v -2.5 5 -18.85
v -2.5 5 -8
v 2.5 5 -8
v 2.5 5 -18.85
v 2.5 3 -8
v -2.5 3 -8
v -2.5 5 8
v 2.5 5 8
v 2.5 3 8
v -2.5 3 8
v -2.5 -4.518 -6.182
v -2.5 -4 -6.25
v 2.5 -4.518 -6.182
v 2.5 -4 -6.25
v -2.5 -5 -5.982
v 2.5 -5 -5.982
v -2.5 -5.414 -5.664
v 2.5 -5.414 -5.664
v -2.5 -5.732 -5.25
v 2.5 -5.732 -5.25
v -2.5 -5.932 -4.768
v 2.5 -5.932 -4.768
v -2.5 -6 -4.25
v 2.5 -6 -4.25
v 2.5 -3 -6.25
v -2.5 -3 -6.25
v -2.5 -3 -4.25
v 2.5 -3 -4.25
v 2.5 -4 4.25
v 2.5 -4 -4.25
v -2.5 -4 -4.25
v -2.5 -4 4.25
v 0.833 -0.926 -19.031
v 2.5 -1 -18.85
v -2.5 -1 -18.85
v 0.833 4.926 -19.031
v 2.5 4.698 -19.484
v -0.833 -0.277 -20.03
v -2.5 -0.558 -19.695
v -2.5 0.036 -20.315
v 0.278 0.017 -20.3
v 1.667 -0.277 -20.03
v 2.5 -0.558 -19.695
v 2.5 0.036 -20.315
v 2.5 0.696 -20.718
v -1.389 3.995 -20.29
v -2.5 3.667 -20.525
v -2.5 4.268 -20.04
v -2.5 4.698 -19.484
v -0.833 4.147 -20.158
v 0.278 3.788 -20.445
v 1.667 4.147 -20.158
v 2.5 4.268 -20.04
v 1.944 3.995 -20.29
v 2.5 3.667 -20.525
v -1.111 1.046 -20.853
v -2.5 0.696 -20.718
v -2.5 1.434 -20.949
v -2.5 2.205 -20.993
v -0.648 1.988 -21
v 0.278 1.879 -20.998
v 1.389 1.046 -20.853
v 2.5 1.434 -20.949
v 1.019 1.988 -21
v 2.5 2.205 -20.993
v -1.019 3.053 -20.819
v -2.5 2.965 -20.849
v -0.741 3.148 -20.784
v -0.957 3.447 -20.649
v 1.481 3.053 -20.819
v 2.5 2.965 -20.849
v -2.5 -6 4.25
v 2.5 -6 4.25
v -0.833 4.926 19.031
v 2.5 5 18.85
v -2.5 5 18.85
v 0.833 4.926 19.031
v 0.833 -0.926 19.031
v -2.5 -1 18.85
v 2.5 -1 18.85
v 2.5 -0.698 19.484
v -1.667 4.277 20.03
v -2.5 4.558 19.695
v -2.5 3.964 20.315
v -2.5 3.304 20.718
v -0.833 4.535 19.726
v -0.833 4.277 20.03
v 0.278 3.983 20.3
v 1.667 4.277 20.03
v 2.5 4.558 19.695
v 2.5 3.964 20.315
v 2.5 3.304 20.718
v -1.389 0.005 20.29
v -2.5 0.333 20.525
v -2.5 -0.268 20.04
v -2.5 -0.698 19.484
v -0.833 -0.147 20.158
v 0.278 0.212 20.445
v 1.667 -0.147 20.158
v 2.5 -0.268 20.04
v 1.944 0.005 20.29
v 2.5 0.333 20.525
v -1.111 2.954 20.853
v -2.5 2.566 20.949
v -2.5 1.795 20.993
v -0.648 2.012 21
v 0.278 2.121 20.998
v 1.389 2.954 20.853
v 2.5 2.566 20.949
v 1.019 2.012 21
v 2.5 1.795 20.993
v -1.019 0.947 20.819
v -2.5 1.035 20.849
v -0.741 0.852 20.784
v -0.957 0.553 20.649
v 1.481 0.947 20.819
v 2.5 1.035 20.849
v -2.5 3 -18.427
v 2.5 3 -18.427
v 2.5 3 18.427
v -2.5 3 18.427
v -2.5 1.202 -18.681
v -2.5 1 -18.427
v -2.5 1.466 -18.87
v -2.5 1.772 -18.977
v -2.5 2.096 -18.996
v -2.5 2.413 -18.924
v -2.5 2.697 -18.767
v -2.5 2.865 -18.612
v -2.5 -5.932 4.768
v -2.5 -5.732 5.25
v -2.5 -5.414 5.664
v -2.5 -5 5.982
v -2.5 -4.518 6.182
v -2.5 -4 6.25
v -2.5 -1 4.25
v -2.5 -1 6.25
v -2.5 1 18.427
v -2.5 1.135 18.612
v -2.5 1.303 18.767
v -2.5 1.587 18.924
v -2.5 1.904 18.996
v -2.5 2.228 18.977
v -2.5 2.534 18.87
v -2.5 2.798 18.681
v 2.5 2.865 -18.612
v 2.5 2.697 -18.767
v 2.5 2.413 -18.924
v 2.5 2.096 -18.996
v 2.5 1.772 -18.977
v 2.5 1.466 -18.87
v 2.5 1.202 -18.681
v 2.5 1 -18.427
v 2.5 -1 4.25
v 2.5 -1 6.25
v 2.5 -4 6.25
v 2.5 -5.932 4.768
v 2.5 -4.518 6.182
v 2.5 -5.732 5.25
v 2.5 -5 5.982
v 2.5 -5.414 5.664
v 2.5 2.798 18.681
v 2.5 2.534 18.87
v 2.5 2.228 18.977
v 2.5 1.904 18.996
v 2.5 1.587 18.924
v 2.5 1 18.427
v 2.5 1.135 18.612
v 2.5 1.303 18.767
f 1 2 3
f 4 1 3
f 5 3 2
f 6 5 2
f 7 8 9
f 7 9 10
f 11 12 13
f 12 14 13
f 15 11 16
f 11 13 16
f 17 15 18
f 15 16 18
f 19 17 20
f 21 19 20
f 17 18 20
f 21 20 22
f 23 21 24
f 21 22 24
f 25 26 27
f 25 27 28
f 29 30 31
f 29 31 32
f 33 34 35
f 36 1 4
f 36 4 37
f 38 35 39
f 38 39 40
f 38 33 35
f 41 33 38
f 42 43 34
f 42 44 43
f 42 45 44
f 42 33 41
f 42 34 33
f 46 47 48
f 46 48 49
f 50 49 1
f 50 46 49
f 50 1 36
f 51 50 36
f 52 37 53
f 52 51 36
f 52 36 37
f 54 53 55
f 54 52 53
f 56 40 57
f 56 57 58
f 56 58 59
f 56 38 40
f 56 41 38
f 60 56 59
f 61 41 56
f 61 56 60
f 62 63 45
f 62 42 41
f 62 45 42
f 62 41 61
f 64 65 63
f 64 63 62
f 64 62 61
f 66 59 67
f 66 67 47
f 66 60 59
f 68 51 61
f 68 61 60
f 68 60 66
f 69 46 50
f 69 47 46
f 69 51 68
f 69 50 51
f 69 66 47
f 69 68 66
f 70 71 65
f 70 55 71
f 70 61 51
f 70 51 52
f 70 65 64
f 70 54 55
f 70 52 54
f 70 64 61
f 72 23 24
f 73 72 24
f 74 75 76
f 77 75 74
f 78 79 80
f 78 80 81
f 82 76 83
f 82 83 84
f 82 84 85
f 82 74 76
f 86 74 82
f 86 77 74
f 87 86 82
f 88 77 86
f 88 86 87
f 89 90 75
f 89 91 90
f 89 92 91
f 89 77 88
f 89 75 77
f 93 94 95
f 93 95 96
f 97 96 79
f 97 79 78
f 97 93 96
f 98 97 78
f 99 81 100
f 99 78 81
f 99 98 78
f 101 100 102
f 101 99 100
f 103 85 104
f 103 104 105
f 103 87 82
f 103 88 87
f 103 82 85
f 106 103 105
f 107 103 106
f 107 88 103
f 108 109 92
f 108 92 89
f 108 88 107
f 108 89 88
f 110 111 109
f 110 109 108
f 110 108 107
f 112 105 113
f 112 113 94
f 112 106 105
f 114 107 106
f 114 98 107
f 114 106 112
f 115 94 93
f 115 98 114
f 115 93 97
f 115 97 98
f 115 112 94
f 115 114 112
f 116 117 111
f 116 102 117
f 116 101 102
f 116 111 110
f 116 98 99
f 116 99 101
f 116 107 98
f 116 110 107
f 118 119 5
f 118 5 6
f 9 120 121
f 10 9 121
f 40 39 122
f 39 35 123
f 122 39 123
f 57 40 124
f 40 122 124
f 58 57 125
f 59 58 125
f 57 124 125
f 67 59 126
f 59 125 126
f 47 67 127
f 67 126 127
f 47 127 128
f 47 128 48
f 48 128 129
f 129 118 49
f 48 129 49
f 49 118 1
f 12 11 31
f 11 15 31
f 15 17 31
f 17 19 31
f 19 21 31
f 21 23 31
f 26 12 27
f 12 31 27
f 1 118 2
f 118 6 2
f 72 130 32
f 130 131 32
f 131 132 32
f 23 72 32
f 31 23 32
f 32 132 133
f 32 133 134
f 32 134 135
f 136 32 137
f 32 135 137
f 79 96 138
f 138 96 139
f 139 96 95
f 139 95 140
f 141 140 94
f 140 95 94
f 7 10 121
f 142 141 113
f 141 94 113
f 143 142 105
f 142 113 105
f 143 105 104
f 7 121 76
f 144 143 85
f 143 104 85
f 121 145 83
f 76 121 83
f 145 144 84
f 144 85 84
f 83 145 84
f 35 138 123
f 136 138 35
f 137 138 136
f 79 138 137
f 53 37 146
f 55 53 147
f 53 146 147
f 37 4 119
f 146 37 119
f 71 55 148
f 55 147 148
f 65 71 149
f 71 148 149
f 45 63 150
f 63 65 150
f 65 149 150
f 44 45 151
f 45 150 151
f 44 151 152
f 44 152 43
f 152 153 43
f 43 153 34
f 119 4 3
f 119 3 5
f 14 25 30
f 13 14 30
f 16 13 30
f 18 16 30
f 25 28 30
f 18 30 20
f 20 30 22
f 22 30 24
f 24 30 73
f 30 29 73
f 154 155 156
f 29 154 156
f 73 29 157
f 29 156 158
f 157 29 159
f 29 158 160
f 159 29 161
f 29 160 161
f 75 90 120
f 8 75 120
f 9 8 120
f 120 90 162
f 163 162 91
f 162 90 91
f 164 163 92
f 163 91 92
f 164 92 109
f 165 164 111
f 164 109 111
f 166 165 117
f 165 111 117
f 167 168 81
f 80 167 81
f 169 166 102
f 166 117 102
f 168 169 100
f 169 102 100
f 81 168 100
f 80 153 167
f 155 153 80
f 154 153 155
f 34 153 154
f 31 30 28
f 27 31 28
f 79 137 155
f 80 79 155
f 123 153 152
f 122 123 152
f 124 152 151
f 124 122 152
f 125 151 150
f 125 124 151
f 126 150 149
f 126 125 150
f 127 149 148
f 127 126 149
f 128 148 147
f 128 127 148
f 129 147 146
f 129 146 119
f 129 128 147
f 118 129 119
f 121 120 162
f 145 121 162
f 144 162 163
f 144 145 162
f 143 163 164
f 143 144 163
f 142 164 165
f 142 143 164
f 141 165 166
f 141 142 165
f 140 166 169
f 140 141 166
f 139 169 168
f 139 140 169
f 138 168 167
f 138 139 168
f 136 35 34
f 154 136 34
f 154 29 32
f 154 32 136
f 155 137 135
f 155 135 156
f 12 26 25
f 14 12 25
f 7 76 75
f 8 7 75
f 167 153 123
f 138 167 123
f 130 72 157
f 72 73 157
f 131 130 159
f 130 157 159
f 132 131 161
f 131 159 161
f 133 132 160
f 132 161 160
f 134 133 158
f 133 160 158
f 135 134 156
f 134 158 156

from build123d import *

# Parameters (mm, degrees)
F2_W      = 5
F2_H      = 2
F5_W      = 5
F5_H      = 12.5
F6_DEPTH  = 5
F7_W      = 3
F7_H      = 8.5
F8_DEPTH  = 5.0010001
F9_W      = 5
F9_H      = 2
F10_DEPTH = 2
F11_R     = 2


with BuildPart() as f3:
    # F3: sweep along a path in F1
    with BuildLine(Plane.YZ) as f3_path:
        Line((4, 8), (4, 18.6544566876))
        ThreePointArc((4, 18.6544566876), (2, 20), (0, 18.6544566876))
        Line((0, 18.6544566876), (0, 0))
        Line((0, 0), (0, -18.6544566876))
        ThreePointArc((0, -18.6544566876), (2, -20), (4, -18.6544566876))
        Line((4, -18.6544566876), (4, -8))
    # F2 (on Top) → F3 (sweep)
    with BuildSketch(Plane.XY):
        Rectangle(F2_W, F2_H)
    sweep(path=f3_path.line, transition=Transition.RIGHT)

    # F5 (on face) → F6 (join)
    with BuildSketch(Plane.XZ.offset(1)):
        Rectangle(F5_W, F5_H)
    extrude(amount=F6_DEPTH)

    # F7 (on face) → F8 (cut, through all)
    with BuildSketch(Plane.YZ.offset(2.5)):
        with Locations((-2.5, 0)):
            Rectangle(F7_W, F7_H)
    extrude(amount=-F8_DEPTH, mode=Mode.SUBTRACT)

    # F9 (on face) → F10 (cut, through all)
    with BuildSketch(Plane(origin=(0, 0, -6.25), x_dir=(1, 0, 0), z_dir=(0, 0, -1))):
        with Locations((0, 2)):
            Rectangle(F9_W, F9_H)
    extrude(amount=-F10_DEPTH, mode=Mode.SUBTRACT)

    # F11
    f11_edges = [f3.edges().sort_by_distance(p)[0] for p in [
        (0, -6, 6.25),
        (0, -6, -6.25),
    ]]
    fillet(f11_edges, radius=F11_R)


solid = f3.part
